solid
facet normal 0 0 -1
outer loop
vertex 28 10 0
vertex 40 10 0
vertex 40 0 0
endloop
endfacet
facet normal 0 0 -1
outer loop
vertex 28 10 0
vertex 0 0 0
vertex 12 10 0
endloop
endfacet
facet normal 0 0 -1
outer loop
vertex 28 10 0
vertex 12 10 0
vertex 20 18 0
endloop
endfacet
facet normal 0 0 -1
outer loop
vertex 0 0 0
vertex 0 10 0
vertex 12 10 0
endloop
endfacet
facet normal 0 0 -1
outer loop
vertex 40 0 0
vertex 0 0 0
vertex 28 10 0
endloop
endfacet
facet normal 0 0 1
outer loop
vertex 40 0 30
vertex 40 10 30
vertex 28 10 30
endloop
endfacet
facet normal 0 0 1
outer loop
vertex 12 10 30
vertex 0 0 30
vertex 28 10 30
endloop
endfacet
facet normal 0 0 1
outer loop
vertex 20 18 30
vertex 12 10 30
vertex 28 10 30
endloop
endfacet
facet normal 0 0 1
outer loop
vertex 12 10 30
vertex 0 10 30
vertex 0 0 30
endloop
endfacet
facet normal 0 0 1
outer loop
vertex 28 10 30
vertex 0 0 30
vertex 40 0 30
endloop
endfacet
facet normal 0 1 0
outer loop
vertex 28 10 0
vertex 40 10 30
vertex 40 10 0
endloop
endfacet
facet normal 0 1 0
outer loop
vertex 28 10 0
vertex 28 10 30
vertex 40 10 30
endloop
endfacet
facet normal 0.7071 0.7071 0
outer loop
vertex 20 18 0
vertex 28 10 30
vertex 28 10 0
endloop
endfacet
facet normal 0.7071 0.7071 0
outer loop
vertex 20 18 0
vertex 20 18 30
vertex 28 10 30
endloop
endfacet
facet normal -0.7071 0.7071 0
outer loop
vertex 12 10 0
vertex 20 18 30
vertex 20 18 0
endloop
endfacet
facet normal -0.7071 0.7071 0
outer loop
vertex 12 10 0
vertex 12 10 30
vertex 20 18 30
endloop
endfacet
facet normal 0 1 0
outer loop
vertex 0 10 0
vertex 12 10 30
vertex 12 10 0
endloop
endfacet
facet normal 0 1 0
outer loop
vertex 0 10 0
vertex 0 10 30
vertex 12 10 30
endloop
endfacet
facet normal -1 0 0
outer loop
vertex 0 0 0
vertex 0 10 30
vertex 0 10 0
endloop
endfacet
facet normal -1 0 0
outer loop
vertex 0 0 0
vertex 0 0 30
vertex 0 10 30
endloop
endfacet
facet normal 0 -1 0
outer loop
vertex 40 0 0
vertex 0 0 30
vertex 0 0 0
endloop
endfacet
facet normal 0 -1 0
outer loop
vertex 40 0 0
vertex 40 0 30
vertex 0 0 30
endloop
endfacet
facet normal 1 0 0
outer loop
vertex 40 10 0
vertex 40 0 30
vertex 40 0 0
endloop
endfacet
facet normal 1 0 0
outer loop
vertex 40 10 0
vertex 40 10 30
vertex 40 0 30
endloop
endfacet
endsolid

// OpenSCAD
$fn = 32;

// ----------------------------------------------------------------------
// V guide rail: vrib, 40 mm wide
// ----------------------------------------------------------------------

// --- parameters (mm) ---
rail_w = 40;              // rail width, X
base_t = 10;              // base plate thickness
v_depth = 8;              // V feature depth / height
v_half_w = 8;             // half width of the V at the base face
plate_t = 30;             // rail length, Z (the extrusion height)

profile = [[0, 0], [40, 0], [40, 10], [28, 10], [20, 18], [12, 10], [0, 10]];  // primary outline, 7 points, counter clockwise

// --- the one profile operation ---
linear_extrude(height = plate_t) polygon(points = profile);
